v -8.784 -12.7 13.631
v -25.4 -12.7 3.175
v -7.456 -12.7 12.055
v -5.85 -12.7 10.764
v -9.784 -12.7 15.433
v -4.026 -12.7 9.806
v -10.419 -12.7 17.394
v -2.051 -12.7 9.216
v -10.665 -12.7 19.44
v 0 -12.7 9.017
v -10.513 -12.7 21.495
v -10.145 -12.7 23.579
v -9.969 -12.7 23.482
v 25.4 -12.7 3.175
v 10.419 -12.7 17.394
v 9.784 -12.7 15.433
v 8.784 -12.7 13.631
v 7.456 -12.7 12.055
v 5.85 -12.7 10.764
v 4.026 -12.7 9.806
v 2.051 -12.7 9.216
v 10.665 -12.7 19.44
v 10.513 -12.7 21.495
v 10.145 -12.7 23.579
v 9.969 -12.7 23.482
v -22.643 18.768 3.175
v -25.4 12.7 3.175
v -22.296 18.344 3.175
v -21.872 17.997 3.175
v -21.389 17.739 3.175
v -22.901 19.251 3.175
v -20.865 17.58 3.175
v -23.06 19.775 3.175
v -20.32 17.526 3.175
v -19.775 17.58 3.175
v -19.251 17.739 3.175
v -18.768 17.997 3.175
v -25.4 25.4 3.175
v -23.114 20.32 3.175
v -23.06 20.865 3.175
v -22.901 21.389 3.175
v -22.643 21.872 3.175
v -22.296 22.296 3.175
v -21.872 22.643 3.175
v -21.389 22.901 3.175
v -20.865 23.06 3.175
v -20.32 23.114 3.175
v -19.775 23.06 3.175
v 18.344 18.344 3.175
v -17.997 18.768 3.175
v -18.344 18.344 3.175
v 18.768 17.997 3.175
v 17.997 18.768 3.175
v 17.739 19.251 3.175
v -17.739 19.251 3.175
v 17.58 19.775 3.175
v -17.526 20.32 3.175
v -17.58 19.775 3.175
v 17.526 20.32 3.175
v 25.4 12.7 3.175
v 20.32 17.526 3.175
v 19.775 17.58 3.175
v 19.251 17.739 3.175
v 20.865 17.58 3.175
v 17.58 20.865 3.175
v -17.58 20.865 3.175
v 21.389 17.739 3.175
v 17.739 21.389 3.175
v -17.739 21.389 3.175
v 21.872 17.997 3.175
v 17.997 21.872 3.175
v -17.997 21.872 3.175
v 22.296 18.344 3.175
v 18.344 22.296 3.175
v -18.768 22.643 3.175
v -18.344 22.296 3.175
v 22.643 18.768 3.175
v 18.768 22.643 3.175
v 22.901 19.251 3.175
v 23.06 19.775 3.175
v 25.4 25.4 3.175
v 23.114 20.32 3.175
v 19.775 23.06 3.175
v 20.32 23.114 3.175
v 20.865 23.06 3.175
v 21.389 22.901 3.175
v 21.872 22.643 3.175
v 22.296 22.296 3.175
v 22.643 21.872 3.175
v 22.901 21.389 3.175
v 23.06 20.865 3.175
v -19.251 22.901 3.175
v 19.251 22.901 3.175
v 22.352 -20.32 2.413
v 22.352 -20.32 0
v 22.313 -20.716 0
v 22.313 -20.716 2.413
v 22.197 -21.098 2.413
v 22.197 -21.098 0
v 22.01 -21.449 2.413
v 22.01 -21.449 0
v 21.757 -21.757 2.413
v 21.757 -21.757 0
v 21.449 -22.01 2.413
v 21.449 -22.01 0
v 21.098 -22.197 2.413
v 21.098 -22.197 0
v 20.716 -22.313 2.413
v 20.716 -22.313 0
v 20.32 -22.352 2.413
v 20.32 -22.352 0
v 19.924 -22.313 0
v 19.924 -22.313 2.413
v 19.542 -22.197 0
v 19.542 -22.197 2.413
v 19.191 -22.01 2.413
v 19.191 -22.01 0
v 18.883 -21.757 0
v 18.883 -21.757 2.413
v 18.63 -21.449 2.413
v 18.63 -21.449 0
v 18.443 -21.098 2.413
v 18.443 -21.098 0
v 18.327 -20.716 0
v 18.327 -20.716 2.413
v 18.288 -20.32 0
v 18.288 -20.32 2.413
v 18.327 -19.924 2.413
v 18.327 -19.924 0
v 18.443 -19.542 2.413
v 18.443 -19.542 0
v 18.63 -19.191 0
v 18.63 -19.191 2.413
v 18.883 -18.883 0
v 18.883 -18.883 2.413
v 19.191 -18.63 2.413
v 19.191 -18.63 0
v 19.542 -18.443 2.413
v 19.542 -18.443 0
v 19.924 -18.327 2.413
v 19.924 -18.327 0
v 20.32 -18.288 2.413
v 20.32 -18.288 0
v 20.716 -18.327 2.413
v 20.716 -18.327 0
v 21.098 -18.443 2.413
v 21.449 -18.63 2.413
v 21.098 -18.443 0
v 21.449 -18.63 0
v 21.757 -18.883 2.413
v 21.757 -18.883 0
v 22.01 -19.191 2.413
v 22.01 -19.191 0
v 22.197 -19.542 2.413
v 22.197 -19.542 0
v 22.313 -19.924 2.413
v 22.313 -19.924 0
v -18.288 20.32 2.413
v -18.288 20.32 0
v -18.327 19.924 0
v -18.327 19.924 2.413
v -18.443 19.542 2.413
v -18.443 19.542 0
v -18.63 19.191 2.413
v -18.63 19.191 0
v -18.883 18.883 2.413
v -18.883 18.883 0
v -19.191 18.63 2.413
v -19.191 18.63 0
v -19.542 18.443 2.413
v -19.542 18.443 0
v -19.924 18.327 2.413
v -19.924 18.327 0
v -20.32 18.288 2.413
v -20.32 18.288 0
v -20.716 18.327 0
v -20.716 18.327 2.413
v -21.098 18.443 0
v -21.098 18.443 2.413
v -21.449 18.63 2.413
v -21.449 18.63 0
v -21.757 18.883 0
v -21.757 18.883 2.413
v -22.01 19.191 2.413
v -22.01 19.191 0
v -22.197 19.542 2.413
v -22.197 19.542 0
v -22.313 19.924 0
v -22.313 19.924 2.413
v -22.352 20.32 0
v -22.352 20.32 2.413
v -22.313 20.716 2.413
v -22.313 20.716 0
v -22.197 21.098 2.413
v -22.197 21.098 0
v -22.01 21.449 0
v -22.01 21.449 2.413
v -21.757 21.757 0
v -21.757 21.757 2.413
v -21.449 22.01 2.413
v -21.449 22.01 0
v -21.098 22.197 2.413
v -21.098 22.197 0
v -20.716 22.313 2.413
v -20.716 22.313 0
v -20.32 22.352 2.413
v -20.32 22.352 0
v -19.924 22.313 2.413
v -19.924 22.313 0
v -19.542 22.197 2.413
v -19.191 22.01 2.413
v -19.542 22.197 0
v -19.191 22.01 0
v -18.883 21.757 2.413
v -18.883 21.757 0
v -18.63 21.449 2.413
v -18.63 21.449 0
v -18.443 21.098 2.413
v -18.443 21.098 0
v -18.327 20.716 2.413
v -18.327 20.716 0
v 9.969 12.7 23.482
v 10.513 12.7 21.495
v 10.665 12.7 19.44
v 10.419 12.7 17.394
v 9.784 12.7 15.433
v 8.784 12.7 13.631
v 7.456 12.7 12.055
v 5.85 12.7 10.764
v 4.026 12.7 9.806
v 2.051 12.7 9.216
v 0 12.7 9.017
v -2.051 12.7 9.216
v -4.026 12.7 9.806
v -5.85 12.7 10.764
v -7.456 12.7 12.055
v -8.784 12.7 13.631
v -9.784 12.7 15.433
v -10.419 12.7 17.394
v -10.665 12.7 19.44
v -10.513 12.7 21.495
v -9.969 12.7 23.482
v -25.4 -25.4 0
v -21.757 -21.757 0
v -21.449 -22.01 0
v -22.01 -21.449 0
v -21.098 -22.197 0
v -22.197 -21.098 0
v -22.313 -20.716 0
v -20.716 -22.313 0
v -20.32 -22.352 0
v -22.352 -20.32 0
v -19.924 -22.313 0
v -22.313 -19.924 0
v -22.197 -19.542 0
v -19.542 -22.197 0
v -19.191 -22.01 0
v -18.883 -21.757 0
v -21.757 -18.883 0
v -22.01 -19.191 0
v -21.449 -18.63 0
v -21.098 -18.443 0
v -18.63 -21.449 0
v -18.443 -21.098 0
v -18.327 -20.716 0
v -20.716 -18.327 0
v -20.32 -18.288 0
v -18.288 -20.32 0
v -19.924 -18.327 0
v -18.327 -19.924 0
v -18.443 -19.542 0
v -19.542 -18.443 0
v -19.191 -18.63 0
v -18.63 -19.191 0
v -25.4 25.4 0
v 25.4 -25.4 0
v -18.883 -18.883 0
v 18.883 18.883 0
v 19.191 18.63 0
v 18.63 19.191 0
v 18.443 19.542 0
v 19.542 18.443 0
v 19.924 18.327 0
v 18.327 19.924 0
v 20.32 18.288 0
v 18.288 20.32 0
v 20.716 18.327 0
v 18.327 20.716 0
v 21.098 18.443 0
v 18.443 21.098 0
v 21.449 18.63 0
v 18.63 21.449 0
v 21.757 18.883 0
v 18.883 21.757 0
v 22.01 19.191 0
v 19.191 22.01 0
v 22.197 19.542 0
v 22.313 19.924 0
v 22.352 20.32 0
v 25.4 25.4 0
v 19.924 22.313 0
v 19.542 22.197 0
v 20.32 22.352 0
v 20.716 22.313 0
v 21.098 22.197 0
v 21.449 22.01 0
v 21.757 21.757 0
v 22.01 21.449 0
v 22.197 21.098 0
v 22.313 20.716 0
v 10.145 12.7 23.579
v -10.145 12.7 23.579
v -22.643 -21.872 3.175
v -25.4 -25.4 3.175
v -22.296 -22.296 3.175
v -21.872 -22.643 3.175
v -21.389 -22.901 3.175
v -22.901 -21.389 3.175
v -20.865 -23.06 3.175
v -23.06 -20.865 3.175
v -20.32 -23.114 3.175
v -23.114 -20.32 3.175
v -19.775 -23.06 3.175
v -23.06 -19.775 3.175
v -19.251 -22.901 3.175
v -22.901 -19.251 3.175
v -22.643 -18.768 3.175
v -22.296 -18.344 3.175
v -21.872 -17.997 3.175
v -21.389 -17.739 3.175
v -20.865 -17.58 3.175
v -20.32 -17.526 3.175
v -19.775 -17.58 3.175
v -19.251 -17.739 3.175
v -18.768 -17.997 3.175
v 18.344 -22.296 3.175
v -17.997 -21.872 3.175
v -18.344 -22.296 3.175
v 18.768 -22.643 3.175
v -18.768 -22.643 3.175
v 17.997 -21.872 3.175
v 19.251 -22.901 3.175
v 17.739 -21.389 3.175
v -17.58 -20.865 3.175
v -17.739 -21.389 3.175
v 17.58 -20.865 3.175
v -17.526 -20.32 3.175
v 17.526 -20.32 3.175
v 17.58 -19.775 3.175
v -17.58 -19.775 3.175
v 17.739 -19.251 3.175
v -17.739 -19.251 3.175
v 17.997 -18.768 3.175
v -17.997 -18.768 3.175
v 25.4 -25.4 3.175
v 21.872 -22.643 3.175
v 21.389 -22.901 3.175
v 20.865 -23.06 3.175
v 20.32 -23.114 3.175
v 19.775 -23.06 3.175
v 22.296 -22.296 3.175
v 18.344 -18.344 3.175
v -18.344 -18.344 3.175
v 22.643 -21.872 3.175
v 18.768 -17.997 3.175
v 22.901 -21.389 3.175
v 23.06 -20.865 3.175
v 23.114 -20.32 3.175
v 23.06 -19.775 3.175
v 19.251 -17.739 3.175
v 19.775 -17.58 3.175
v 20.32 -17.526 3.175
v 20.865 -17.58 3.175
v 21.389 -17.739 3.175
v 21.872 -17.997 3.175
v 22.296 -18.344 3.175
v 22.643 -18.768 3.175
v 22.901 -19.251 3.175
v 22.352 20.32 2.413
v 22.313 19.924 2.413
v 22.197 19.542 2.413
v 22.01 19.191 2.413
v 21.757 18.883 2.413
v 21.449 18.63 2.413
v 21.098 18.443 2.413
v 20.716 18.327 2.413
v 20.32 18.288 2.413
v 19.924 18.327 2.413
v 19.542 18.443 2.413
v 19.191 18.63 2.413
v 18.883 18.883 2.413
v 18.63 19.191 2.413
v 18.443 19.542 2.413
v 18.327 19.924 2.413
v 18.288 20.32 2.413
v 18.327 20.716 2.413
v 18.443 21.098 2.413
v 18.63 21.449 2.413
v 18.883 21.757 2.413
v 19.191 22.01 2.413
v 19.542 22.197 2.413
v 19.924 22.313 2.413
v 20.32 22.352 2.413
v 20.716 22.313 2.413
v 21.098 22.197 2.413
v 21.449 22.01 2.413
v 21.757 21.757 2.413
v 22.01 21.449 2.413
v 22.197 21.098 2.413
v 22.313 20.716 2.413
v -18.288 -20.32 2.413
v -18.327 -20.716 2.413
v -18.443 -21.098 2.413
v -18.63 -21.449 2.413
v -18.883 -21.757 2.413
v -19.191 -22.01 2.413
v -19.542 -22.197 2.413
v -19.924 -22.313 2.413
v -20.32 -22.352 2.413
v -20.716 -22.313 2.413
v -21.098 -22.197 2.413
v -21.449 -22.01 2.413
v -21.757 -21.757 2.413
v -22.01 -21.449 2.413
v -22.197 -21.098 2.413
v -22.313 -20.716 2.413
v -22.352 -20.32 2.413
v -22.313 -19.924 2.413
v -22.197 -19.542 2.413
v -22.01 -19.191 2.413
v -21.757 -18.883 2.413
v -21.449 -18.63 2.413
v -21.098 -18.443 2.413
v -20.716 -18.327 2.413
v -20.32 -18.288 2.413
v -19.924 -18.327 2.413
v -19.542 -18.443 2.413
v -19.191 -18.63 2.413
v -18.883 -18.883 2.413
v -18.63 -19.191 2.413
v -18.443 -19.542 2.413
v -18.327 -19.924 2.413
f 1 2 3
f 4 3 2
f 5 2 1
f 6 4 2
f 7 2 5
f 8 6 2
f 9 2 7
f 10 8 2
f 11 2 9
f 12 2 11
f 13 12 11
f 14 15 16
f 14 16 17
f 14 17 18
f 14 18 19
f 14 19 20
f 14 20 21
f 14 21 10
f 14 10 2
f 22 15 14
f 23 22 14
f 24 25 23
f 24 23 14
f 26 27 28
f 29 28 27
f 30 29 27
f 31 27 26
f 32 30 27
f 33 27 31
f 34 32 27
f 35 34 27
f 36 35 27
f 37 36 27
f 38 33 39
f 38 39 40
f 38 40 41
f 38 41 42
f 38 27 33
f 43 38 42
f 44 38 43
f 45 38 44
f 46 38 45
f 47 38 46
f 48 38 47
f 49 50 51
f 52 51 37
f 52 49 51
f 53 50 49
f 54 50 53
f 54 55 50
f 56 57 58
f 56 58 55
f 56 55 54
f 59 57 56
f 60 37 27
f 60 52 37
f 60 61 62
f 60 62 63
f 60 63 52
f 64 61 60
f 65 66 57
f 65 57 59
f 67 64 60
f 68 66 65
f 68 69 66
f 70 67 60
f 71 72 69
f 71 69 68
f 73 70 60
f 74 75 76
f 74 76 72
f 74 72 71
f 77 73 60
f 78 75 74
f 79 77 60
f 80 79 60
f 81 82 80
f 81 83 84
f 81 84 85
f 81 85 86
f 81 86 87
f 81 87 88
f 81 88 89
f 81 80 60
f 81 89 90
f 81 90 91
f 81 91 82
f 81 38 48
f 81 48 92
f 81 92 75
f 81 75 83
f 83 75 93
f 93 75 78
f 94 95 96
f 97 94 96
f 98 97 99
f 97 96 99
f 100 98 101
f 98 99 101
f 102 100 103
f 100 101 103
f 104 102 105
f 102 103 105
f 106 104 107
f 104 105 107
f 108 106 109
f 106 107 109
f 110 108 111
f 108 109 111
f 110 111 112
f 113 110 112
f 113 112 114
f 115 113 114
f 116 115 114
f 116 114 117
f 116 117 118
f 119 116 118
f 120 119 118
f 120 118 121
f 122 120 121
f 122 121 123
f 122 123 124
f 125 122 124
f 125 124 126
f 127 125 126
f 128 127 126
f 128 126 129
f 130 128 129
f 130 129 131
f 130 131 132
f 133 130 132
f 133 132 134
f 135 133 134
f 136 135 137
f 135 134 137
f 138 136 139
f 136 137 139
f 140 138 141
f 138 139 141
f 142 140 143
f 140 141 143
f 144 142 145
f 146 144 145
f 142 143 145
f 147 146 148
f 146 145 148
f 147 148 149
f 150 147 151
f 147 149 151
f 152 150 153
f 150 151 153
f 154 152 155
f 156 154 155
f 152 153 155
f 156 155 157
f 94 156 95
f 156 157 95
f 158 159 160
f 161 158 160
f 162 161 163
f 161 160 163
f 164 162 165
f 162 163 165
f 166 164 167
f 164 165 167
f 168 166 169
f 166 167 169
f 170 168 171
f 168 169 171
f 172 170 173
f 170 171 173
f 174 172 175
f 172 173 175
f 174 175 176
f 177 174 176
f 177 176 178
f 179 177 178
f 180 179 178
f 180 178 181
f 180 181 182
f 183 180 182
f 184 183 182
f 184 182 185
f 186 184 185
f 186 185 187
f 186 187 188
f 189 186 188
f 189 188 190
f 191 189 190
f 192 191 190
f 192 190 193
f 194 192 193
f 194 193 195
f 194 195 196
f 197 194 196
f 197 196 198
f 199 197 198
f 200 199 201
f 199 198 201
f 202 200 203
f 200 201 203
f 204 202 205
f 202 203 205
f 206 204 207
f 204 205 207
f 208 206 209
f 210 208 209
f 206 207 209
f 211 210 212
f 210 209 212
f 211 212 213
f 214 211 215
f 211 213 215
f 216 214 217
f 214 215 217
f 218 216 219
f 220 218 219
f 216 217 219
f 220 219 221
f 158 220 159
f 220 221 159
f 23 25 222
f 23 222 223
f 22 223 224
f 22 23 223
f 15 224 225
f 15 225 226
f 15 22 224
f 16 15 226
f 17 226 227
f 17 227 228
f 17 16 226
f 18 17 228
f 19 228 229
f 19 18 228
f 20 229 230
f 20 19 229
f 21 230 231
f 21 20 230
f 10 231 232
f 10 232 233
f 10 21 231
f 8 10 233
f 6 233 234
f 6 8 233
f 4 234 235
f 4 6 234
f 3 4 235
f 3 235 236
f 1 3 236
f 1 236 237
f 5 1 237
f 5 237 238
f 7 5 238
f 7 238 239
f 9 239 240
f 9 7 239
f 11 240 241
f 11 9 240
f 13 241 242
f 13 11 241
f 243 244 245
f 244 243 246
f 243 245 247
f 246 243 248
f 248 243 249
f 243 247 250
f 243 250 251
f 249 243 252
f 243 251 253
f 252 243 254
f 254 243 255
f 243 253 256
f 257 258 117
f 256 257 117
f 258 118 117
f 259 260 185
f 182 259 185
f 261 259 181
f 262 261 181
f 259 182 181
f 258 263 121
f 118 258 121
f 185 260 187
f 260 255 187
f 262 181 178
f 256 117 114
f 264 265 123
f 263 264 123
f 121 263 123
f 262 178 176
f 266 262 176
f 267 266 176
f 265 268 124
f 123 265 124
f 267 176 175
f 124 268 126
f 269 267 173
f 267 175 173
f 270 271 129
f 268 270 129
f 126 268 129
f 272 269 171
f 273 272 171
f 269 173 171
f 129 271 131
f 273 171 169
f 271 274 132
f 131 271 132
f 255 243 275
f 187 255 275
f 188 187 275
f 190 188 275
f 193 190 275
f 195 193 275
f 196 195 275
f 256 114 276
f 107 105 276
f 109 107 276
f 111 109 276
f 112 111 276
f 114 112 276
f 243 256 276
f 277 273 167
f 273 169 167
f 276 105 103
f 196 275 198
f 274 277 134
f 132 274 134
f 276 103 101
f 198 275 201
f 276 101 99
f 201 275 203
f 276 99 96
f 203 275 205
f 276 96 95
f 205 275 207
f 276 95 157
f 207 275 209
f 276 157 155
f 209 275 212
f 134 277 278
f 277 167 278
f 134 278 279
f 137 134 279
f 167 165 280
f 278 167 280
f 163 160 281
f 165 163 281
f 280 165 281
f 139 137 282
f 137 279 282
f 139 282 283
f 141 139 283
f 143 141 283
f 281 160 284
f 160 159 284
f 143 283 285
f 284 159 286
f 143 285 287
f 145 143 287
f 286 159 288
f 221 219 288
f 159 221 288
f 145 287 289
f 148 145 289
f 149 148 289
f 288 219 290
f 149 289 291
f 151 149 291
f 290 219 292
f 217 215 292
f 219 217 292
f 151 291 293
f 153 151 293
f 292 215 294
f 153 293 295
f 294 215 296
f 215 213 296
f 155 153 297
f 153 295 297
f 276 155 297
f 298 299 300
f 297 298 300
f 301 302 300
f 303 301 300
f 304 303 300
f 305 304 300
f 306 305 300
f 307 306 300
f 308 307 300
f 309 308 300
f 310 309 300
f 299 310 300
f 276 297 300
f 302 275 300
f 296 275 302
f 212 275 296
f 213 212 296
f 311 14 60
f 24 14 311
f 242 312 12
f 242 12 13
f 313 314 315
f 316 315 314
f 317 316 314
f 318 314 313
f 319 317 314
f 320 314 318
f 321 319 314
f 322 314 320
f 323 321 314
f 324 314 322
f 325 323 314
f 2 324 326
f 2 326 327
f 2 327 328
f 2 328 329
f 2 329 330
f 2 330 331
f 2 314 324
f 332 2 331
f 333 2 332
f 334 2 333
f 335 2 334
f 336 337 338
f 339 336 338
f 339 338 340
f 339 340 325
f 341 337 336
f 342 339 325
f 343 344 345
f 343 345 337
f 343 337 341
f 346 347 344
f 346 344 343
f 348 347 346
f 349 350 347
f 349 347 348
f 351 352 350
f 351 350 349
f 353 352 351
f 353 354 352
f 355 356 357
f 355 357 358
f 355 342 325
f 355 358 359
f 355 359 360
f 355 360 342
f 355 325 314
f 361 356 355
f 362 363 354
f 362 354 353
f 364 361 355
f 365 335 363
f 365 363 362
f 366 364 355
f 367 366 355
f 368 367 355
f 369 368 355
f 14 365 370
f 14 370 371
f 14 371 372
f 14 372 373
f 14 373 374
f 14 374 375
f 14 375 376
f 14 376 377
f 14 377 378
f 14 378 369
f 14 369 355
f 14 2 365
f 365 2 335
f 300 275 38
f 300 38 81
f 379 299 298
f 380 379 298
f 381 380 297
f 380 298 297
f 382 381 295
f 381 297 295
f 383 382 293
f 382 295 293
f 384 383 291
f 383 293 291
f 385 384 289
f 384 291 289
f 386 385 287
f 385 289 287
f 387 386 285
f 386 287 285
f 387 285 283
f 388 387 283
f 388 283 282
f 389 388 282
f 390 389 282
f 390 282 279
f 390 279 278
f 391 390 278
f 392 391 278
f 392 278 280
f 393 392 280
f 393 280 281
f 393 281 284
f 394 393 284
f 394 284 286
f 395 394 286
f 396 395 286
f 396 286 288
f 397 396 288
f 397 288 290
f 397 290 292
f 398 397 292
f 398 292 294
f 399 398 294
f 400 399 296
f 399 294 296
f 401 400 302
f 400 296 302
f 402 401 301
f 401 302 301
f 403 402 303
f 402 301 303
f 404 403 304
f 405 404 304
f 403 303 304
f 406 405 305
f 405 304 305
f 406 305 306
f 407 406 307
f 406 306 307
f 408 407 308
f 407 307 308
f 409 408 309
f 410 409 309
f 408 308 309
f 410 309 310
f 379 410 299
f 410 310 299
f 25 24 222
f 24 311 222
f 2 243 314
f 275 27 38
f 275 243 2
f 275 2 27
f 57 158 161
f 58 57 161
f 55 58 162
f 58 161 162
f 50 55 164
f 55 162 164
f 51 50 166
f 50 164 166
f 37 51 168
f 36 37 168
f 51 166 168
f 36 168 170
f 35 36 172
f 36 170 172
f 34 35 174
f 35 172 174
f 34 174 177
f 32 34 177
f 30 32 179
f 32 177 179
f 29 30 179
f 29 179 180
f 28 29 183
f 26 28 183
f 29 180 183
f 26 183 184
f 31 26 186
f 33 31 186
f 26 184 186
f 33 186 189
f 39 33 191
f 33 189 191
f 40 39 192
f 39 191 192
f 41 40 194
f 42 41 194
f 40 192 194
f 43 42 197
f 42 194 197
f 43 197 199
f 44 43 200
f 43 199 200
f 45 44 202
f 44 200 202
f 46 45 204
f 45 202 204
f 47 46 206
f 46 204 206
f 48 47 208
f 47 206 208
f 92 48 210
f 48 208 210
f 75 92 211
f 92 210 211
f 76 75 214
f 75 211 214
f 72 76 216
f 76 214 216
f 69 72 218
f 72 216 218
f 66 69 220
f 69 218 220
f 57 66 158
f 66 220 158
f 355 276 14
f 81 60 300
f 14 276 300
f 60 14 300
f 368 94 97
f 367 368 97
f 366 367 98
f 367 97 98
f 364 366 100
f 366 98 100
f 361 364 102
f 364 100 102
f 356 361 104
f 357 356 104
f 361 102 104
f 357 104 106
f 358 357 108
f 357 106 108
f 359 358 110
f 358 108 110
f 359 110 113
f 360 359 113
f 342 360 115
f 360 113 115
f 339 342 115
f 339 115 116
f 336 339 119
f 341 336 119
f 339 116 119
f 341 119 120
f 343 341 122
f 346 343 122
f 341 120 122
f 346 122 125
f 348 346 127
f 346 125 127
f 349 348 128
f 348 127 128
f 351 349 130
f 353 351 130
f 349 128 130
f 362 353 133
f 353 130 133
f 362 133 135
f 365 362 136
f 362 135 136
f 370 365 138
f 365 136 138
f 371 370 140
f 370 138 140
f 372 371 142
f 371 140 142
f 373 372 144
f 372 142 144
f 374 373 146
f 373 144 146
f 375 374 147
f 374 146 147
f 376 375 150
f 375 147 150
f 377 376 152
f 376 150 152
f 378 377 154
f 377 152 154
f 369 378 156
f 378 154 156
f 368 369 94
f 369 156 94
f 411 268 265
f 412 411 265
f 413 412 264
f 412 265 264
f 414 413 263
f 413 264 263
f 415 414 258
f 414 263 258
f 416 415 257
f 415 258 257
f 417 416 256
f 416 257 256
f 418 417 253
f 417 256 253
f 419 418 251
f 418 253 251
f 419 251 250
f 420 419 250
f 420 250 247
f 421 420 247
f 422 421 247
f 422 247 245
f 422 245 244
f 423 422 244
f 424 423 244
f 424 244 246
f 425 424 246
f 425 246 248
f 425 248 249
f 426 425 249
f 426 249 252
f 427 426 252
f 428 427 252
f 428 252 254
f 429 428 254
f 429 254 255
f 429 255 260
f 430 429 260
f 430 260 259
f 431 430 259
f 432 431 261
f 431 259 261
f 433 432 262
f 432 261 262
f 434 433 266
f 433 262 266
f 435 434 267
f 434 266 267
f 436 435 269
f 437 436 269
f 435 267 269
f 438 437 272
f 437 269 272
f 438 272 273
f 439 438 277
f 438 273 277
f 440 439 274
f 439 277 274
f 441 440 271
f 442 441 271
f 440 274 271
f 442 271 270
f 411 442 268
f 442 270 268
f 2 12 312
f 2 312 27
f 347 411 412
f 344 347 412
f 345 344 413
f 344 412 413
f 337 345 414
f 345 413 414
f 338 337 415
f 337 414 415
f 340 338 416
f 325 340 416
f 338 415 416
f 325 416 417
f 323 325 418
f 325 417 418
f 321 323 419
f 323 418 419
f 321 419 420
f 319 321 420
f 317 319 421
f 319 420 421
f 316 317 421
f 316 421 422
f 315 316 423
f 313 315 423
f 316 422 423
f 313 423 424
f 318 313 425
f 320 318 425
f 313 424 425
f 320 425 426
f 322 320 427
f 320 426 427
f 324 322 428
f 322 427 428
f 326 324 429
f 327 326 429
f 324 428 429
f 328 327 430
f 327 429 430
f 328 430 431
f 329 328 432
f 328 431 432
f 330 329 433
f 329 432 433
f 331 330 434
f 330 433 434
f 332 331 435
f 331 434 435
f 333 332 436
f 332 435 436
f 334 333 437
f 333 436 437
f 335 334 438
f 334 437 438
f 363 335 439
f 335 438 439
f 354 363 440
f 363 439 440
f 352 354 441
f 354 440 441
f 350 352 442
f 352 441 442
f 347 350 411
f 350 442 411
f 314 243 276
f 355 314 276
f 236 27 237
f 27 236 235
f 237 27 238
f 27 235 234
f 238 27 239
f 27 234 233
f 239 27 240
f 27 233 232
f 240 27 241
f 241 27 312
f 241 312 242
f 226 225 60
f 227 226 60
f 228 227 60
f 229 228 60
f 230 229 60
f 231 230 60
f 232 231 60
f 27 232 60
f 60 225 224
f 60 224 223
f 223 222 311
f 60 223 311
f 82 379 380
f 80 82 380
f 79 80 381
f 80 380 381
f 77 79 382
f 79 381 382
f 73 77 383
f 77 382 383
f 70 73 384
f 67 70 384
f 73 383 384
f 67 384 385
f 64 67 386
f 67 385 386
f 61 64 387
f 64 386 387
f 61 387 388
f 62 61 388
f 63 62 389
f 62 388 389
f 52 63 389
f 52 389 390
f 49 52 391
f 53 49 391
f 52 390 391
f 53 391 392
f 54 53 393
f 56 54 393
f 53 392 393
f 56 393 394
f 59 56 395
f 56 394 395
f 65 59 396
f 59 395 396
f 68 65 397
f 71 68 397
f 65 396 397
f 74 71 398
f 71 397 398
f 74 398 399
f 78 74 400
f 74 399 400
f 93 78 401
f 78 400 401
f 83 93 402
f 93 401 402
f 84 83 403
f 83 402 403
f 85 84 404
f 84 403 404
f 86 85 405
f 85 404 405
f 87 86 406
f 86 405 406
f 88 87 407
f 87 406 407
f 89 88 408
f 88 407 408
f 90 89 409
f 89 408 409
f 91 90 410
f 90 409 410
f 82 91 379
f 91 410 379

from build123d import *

# Parameters (mm, degrees)
F0_W        = 50.8
F0_H        = 50.8
F1_DEPTH    = 3.175
F3_DEPTH    = 12.7
F4_T1_DEPTH = 29.6642315955
F5_R        = 2.032
F6_DEPTH    = 25.4
F7_SIZE     = 0.762


# Not quite as in the source:
# - a fillet or chamfer that OpenCascade refuses, or shapes differently, is made with other operations: its cross-section is extruded or revolved along the edge and cut away or added


with BuildPart() as f1:
    # F0 (on Top) → F1 (new body)
    with BuildSketch(Plane.XY):
        Rectangle(F0_W, F0_H)
    extrude(amount=F1_DEPTH)

    # F2 (on Front) → F3 (join, symmetric)
    with BuildSketch(Plane.XZ):
        with BuildLine():
            ThreePointArc((9.6386223082, 24.257), (0, 9.017), (-9.6386223082, 24.257))
            Line((-9.6386223082, 24.257), (-25.4, 3.175))
            Line((-25.4, 3.175), (25.4, 3.175))
            Line((25.4, 3.175), (9.6386223082, 24.257))
        make_face()
    extrude(amount=F3_DEPTH, both=True)

    # F4: chamfer of 1.016 on 2 edges, made by hand

    # F4_s2 → F4_t1 (cut)
    with BuildSketch(Plane.XZ.offset(-14.8321157977)):
        with BuildLine():
            Line((-10.1809562751, 23.5988049587), (-9.9336646357, 23.4627576649))
            Line((-9.9336646357, 23.4627576649), (-9.9146755466, 23.4555246232))
            ThreePointArc((-9.9146755466, 23.4555246232), (-9.7936995215, 23.8631023282), (-9.6202630276, 24.2482914286))
            Line((-9.6202630276, 24.2482914286), (-9.6548968618, 24.2691672226))
            ThreePointArc((-9.6548968618, 24.2691672226), (-9.9099463042, 23.9280198655), (-10.1972308287, 23.6109721813))
            Line((-10.1972308287, 23.6109721813), (-10.1809562751, 23.5988049587))
        make_face()
        with BuildLine():
            Line((10.1809562751, 23.5988049587), (9.9336646357, 23.4627576649))
            Line((9.9336646357, 23.4627576649), (9.9146755466, 23.4555246232))
            ThreePointArc((9.9146755466, 23.4555246232), (9.7936995215, 23.8631023282), (9.6202630276, 24.2482914286))
            Line((9.6202630276, 24.2482914286), (9.6548968618, 24.2691672226))
            ThreePointArc((9.6548968618, 24.2691672226), (9.9099463042, 23.9280198655), (10.1972308287, 23.6109721813))
            Line((10.1972308287, 23.6109721813), (10.1809562751, 23.5988049587))
        make_face()
    extrude(amount=F4_T1_DEPTH, mode=Mode.SUBTRACT)

    # F5 (on face) → F6 (cut)
    with BuildSketch(Plane(origin=(0, 0, 0), x_dir=(1, 0, 0), z_dir=(0, 0, -1))):
        with Locations((-20.32, 20.32)):
            Circle(F5_R)
        with Locations((-20.32, -20.32)):
            Circle(F5_R)
        with Locations((20.32, 20.32)):
            Circle(F5_R)
        with Locations((20.32, -20.32)):
            Circle(F5_R)
    extrude(amount=-F6_DEPTH, mode=Mode.SUBTRACT)

    # F7
    f7_edges = [f1.edges().sort_by_distance(p)[0] for p in [
        (-22.352, -20.32, 3.175),
        (-22.352, 20.32, 3.175),
        (18.288, 20.32, 3.175),
        (18.288, -20.32, 3.175),
    ]]
    chamfer(f7_edges, length=F7_SIZE)


solid = f1.part
